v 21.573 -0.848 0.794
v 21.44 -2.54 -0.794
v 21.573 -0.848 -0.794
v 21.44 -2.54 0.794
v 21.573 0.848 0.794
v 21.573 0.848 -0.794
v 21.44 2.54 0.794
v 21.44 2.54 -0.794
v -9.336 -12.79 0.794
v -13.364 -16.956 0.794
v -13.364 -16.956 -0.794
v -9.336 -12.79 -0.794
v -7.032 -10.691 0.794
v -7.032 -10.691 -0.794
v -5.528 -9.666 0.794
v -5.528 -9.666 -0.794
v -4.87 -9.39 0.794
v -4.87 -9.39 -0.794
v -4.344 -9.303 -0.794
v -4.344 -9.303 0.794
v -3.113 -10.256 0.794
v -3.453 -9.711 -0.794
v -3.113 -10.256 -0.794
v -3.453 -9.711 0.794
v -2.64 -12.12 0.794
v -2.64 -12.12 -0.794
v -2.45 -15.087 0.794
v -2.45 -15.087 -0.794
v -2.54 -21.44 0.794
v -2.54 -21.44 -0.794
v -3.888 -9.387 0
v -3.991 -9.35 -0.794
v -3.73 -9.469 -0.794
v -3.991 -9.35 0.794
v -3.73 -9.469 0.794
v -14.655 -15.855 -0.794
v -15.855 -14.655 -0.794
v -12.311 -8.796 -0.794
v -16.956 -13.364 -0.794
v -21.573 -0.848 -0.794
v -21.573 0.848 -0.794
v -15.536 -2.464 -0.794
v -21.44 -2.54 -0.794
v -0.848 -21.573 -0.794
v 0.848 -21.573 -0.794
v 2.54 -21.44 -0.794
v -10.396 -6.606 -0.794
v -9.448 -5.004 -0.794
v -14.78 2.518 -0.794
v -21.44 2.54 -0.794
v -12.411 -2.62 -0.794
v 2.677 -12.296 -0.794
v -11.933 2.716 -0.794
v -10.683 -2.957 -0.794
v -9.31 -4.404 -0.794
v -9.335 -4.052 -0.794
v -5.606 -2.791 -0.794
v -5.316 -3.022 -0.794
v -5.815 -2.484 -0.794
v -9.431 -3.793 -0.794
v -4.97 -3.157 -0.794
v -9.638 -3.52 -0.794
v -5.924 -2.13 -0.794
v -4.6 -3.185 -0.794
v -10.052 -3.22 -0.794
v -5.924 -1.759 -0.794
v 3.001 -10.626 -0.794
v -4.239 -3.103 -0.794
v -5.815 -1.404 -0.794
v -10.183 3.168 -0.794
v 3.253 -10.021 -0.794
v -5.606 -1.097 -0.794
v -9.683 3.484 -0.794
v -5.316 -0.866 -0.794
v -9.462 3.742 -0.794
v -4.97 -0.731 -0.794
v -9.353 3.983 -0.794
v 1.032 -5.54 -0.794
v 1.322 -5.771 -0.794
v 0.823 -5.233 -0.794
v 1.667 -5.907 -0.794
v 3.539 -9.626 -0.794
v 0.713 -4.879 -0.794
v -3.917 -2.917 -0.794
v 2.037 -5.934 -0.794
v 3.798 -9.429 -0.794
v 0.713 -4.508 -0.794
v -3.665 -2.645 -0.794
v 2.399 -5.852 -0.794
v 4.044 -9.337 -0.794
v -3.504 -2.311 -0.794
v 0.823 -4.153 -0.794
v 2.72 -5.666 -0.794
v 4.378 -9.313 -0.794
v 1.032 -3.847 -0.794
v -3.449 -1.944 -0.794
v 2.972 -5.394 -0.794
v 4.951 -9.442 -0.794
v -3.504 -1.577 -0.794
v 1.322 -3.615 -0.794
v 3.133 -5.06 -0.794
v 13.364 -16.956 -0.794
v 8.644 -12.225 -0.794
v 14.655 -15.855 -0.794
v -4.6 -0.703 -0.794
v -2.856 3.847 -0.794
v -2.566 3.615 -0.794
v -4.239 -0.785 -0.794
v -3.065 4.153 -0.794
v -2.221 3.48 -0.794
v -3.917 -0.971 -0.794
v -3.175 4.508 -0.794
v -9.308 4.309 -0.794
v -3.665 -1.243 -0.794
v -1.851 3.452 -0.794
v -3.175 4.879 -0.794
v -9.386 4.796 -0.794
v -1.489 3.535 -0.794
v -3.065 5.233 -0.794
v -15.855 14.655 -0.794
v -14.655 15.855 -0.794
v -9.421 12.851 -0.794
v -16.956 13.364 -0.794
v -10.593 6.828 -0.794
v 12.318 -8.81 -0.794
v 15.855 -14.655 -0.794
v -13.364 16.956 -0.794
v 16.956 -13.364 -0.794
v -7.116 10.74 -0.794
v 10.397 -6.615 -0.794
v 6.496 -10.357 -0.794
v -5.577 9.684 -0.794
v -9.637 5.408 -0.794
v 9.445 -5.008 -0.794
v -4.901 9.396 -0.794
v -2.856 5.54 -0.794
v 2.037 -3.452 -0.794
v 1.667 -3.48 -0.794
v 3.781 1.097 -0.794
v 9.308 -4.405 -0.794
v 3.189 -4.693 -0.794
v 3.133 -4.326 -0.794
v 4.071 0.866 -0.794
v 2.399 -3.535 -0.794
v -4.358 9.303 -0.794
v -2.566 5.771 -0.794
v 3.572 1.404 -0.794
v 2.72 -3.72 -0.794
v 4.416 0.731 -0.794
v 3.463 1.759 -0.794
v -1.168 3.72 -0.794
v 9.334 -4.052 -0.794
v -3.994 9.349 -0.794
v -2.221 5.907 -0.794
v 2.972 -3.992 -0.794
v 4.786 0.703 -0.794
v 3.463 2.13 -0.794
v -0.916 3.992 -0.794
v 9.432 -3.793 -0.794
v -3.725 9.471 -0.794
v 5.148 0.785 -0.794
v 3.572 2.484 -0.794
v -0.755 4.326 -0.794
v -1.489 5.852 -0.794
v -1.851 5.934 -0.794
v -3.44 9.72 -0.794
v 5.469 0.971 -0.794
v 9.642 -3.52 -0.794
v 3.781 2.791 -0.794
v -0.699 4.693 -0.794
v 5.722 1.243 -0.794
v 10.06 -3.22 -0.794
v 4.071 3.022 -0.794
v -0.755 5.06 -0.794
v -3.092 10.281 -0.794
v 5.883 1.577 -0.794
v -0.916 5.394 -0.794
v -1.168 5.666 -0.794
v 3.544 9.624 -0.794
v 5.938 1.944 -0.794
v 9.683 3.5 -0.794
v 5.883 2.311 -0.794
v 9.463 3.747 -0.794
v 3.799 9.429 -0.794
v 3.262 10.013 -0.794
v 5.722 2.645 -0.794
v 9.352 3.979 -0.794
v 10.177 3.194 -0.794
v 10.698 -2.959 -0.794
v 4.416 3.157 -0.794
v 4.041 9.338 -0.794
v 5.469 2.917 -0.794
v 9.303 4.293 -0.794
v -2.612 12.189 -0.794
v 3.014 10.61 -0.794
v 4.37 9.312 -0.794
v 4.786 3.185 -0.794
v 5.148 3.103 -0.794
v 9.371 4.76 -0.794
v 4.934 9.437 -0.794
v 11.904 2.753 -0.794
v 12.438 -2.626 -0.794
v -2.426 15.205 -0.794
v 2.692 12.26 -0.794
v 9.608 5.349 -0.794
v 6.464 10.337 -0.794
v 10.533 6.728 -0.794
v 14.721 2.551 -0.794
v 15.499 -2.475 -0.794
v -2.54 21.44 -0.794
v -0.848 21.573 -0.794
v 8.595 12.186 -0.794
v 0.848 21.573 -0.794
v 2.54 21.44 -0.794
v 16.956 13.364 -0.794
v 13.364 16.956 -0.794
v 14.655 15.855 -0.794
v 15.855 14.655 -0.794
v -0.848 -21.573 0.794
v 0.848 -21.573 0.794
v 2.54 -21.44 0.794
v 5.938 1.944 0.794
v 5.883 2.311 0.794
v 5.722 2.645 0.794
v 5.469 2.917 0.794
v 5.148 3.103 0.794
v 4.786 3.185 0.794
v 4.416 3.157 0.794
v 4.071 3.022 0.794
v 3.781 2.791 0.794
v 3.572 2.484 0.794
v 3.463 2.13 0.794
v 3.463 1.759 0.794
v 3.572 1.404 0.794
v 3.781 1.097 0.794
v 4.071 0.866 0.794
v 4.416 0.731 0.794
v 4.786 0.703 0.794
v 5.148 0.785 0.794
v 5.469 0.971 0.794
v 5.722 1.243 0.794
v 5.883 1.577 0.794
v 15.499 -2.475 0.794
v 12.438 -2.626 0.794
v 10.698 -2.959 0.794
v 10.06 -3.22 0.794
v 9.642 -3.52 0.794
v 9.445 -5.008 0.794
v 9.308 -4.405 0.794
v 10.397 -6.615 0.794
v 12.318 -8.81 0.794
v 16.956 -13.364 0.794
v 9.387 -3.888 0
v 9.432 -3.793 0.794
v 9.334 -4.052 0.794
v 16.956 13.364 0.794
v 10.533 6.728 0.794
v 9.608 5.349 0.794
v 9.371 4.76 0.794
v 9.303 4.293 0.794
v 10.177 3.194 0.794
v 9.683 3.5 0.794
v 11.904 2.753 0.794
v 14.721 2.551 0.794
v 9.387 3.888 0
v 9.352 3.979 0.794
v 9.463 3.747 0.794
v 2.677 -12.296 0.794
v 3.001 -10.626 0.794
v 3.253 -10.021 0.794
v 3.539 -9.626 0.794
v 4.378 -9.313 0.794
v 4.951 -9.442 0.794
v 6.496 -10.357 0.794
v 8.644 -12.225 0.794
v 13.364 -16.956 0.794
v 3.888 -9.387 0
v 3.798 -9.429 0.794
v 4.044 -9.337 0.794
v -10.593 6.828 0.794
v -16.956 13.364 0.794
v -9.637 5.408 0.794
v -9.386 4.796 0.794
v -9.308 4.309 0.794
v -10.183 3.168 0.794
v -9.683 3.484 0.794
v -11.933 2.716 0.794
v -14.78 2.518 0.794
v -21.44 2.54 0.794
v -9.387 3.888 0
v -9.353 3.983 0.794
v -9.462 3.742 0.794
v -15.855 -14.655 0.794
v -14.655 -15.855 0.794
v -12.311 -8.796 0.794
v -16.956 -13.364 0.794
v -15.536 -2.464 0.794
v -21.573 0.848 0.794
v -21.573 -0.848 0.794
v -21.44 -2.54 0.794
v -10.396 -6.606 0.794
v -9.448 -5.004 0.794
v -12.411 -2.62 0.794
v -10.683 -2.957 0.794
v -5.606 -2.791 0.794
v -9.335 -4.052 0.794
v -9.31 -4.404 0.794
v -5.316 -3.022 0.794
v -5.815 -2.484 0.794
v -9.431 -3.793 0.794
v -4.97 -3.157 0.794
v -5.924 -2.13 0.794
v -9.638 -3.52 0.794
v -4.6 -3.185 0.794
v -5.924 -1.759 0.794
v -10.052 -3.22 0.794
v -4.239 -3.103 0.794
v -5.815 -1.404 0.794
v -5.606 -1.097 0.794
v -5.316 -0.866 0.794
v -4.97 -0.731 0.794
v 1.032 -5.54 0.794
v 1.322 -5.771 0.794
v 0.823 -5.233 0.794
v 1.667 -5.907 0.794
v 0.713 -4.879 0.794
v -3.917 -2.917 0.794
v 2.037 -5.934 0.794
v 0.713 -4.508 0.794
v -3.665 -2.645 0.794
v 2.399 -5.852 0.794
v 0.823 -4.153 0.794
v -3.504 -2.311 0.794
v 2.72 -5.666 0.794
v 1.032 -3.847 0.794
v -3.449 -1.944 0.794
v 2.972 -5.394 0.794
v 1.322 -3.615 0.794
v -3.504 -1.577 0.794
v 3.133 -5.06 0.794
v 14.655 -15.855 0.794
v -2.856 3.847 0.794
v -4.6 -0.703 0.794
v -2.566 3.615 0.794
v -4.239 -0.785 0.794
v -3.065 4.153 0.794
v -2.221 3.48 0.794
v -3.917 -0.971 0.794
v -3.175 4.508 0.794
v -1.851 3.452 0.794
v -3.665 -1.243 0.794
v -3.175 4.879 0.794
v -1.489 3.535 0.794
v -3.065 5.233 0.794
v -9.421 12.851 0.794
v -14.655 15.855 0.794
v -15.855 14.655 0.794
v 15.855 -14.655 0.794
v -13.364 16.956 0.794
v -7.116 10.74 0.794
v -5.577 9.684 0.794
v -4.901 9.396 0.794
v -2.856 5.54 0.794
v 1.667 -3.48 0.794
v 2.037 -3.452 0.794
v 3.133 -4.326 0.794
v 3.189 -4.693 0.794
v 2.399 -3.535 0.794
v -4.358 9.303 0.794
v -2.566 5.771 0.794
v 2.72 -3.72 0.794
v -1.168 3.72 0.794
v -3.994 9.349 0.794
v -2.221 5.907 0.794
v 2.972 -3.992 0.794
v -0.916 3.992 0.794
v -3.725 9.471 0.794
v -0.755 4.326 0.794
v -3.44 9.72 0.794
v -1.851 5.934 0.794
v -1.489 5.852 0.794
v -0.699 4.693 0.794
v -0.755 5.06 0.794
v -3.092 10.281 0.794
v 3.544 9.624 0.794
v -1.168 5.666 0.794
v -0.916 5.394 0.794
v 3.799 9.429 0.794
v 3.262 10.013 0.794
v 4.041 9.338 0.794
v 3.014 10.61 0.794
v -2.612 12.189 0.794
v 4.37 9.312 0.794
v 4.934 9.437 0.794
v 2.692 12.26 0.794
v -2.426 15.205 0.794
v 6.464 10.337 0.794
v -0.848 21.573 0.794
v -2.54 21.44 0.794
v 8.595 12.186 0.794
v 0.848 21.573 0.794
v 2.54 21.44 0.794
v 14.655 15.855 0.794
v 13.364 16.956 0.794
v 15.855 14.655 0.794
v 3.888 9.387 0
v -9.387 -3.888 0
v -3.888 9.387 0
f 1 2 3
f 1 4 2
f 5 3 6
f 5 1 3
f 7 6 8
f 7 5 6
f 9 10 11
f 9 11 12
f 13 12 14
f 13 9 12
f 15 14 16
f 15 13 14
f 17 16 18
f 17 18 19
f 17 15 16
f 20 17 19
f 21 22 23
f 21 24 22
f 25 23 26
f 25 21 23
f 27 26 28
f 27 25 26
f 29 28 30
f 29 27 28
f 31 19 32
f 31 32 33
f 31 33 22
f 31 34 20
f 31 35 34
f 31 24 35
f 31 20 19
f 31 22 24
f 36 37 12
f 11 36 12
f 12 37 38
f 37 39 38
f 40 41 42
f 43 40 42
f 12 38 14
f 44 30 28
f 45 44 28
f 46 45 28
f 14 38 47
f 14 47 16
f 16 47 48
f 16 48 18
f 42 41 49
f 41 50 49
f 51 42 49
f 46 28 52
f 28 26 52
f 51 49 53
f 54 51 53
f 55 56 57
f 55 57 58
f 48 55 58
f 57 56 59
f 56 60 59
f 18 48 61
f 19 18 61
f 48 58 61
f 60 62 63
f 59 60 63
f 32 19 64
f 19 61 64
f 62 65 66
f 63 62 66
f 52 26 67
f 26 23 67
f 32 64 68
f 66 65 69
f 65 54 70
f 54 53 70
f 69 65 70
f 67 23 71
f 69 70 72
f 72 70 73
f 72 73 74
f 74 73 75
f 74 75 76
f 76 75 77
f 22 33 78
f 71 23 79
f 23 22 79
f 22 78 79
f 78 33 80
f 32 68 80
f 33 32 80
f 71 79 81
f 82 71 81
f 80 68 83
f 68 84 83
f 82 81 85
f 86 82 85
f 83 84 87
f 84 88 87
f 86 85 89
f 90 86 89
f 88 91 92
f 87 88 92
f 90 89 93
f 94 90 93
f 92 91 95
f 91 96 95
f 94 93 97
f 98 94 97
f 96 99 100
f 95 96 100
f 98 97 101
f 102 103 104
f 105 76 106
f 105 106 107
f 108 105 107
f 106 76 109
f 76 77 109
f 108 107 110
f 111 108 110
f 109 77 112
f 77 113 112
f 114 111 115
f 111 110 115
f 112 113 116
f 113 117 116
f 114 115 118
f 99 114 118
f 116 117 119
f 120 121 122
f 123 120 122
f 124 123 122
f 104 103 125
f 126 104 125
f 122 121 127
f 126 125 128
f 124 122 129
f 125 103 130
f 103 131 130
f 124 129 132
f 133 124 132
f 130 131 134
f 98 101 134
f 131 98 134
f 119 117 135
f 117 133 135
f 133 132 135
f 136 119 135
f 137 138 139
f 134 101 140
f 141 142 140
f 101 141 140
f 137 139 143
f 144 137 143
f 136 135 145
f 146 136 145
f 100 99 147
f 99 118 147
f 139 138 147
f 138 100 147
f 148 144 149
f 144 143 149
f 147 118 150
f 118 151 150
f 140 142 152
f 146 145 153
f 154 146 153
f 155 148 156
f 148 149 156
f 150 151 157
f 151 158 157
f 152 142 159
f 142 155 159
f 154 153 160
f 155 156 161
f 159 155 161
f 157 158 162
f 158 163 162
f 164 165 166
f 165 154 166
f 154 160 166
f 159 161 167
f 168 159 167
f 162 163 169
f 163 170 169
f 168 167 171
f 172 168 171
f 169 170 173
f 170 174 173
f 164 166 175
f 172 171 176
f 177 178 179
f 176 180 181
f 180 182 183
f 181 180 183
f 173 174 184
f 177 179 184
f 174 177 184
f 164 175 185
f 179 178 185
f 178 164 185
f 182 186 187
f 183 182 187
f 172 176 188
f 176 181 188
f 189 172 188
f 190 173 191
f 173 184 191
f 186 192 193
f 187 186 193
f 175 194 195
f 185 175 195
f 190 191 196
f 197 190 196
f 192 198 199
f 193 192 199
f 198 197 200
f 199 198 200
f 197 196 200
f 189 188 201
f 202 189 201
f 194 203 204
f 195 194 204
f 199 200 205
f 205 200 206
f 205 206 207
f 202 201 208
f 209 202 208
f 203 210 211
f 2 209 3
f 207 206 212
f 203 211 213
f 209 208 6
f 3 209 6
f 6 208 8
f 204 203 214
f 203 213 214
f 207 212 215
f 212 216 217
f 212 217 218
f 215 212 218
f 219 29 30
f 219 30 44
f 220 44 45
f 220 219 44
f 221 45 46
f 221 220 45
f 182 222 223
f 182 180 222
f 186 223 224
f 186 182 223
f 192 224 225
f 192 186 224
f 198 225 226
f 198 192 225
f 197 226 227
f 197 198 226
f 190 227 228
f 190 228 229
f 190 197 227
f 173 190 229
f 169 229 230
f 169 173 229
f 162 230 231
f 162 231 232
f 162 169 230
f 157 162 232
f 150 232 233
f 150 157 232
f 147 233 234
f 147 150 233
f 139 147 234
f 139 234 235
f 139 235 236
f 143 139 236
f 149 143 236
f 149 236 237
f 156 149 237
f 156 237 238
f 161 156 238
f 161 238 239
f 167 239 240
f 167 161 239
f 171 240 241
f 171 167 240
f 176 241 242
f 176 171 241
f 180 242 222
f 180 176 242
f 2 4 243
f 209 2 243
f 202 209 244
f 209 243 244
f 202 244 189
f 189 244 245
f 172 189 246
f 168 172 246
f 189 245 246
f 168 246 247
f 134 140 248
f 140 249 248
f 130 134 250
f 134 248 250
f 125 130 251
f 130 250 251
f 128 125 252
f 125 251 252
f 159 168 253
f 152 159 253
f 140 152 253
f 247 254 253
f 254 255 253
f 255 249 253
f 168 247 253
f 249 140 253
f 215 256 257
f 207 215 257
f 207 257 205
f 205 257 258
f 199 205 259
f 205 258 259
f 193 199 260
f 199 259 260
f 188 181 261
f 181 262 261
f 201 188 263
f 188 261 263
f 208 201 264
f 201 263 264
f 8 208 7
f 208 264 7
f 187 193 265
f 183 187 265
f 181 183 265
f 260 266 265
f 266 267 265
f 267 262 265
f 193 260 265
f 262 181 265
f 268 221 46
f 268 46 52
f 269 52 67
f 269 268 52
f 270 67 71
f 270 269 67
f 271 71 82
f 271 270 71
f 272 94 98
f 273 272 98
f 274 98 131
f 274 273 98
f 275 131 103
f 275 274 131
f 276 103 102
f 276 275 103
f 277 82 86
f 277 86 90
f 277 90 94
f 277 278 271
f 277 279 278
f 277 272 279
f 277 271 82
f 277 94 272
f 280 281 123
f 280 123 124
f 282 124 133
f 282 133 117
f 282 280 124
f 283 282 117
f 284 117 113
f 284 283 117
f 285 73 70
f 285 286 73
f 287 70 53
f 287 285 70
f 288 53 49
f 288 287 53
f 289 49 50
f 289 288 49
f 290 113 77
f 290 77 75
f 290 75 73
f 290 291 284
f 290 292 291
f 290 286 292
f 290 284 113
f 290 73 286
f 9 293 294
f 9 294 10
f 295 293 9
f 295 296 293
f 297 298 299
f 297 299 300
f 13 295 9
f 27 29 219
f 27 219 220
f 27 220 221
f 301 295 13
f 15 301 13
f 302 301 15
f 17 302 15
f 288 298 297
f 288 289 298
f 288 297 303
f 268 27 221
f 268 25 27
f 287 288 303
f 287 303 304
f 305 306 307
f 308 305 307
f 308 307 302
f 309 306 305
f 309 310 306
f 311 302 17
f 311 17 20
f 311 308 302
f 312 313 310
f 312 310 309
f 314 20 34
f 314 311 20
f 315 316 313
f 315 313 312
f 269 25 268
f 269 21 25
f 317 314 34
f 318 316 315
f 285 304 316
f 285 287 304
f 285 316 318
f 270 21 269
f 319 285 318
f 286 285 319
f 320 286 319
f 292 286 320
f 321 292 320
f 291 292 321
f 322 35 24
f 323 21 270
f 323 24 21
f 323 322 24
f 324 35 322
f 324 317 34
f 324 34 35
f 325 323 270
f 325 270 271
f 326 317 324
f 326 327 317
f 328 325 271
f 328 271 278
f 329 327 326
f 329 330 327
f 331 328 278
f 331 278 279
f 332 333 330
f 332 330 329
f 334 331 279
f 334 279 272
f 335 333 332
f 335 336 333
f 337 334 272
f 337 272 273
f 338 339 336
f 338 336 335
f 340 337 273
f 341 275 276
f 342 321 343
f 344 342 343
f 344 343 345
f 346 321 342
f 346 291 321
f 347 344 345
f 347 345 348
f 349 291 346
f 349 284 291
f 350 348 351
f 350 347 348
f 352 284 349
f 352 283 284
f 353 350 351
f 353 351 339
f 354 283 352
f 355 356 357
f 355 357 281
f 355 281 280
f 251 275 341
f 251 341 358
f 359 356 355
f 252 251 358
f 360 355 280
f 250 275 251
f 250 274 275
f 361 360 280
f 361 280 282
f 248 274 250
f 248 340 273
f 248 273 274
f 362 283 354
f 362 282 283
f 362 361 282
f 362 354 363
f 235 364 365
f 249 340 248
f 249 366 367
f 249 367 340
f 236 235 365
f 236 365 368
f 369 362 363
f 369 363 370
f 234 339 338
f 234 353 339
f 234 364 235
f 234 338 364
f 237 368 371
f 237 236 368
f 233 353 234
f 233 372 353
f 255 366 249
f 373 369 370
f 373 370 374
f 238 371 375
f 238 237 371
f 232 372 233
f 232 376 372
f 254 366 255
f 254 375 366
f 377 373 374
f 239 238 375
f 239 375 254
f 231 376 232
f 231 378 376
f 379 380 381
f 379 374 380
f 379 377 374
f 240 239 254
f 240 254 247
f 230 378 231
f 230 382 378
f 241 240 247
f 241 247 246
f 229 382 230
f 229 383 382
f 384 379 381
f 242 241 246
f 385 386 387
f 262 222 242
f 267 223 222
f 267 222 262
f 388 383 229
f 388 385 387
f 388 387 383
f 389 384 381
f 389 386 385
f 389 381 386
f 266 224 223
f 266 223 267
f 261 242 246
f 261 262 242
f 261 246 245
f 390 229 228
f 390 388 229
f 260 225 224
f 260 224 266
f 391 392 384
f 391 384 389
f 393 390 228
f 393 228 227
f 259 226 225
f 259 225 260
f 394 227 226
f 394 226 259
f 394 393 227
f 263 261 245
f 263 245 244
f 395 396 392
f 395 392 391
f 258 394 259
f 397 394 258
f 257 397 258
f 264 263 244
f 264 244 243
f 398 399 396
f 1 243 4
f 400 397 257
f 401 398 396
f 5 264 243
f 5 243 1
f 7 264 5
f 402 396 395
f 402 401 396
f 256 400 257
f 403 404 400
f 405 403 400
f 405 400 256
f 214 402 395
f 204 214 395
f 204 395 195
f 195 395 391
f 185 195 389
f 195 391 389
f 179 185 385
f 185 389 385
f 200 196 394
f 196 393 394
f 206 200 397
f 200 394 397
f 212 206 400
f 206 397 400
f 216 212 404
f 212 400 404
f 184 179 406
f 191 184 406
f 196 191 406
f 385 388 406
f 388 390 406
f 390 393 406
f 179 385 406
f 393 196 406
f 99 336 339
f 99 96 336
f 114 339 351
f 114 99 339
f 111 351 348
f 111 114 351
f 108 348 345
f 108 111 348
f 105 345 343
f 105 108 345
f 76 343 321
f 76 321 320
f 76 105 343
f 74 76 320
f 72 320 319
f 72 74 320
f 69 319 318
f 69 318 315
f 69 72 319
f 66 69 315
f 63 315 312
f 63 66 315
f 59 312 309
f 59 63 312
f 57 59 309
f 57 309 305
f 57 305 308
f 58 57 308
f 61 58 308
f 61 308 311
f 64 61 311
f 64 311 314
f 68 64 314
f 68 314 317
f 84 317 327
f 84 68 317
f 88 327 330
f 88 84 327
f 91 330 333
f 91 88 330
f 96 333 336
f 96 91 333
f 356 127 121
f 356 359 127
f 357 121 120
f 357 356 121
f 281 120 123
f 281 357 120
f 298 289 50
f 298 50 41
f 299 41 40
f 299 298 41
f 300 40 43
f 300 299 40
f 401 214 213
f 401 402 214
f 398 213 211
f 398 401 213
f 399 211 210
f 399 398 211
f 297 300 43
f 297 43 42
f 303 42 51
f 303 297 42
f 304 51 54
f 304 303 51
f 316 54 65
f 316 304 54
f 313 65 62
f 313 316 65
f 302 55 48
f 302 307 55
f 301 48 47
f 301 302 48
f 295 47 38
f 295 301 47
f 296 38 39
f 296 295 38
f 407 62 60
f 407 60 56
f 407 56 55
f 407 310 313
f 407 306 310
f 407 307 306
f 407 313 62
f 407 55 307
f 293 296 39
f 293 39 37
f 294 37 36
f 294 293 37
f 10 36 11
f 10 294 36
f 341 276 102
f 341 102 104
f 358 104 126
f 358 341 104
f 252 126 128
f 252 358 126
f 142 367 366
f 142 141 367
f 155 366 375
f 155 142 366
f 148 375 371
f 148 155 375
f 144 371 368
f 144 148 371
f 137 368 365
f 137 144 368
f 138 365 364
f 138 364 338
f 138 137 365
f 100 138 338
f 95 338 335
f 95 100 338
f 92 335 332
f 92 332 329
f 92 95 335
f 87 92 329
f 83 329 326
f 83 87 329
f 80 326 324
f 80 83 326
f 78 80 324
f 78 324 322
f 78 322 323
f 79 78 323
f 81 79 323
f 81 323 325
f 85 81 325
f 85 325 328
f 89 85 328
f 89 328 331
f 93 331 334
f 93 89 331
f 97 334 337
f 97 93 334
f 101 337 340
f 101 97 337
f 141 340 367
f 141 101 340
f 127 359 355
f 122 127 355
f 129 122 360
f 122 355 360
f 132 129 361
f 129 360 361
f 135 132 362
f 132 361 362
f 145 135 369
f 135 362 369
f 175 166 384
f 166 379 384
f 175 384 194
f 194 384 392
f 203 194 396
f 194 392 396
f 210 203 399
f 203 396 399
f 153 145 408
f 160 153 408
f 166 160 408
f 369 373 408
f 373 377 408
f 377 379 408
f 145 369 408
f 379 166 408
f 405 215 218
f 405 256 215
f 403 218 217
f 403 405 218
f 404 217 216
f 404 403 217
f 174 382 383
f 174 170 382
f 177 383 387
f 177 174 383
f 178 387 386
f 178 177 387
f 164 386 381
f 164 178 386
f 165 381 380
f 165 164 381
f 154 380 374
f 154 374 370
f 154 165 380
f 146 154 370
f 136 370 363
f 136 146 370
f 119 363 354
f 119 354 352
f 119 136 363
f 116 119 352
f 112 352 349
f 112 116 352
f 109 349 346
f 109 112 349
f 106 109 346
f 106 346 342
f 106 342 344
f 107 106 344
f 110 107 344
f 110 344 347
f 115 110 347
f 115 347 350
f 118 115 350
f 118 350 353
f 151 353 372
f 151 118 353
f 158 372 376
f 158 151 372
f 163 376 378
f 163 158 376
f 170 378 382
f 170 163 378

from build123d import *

# Parameters (mm, degrees)
F0_R     = 1.2446
F1_DEPTH = 0.79375
F6_DEPTH = 1.5875


with BuildPart() as f1:
    # F0 (on Top) → F1 (new body, symmetric)
    with BuildSketch(Plane.XY):
        with BuildLine():
            ThreePointArc((-13.3643659864, 16.9564684348), (-15.2664354058, 15.2664354058), (-16.9564684348, 13.3643659864))
            ThreePointArc((-16.9564684348, 13.3643659864), (-16.6604544533, 6.9009861898), (-21.4400676305, 2.54))
            ThreePointArc((-21.4400676305, 2.54), (-21.59, 0), (-21.4400676305, -2.54))
            ThreePointArc((-21.4400676305, -2.54), (-16.6604544533, -6.9009861898), (-16.9564684348, -13.3643659864))
            ThreePointArc((-16.9564684348, -13.3643659864), (-15.2664354058, -15.2664354058), (-13.3643659864, -16.9564684348))
            ThreePointArc((-13.3643659864, -16.9564684348), (-6.9009861898, -16.6604544533), (-2.54, -21.4400676305))
            ThreePointArc((-2.54, -21.4400676305), (0, -21.59), (2.54, -21.4400676305))
            ThreePointArc((2.54, -21.4400676305), (6.9009861898, -16.6604544533), (13.3643659864, -16.9564684348))
            ThreePointArc((13.3643659864, -16.9564684348), (15.2664354058, -15.2664354058), (16.9564684348, -13.3643659864))
            ThreePointArc((16.9564684348, -13.3643659864), (16.6604544533, -6.9009861898), (21.4400676305, -2.54))
            ThreePointArc((21.4400676305, -2.54), (21.59, 0), (21.4400676305, 2.54))
            ThreePointArc((21.4400676305, 2.54), (16.6604544533, 6.9009861898), (16.9564684348, 13.3643659864))
            ThreePointArc((16.9564684348, 13.3643659864), (15.2664354058, 15.2664354058), (13.3643659864, 16.9564684348))
            ThreePointArc((13.3643659864, 16.9564684348), (6.9009861898, 16.6604544533), (2.54, 21.4400676305))
            ThreePointArc((2.54, 21.4400676305), (0, 21.59), (-2.54, 21.4400676305))
            ThreePointArc((-2.54, 21.4400676305), (-6.9009861898, 16.6604544533), (-13.3643659864, 16.9564684348))
        make_face()
        with Locations((-4.6933080252, -1.9440318364)):
            Circle(F0_R, mode=Mode.SUBTRACT)
        with Locations((1.9440318364, -4.6933080252)):
            Circle(F0_R, mode=Mode.SUBTRACT)
        with Locations((-1.9440318364, 4.6933080252)):
            Circle(F0_R, mode=Mode.SUBTRACT)
        with Locations((4.6933080252, 1.9440318364)):
            Circle(F0_R, mode=Mode.SUBTRACT)
    extrude(amount=F1_DEPTH, both=True)

    # F5 (on face) → F6 (cut, through all)
    with BuildSketch(Plane.XY.offset(0.79375)):
        with BuildLine():
            ThreePointArc((21.4400676305, 2.54), (16.6604544533, 6.9009861898), (16.9564684348, 13.3643659864))
            add(Edge.make_bspline(
                [(16.9564684348, 13.3643659864), (12.7702234313, 9.1661904007), (4.5537464117, 1.9143787537), (15.6687479466, 2.5573067833), (21.4400676305, 2.54)],
                knots=[0, 0, 0, 0, 0.5, 1, 1, 1, 1], degree=3))
        make_face()
        with BuildLine():
            ThreePointArc((2.54, -21.4400676305), (6.9009861898, -16.6604544533), (13.3643659864, -16.9564684348))
            add(Edge.make_bspline(
                [(2.54, -21.4400676305), (2.5372293312, -15.7558191568), (1.8345788445, -4.4215889444), (9.3458676711, -12.9474671558), (13.3643659864, -16.9564684348)],
                knots=[0, 0, 0, 0, 0.5, 1, 1, 1, 1], degree=3))
        make_face()
        with BuildLine():
            ThreePointArc((16.9564684348, -13.3643659864), (16.6604544533, -6.9009861898), (21.4400676305, -2.54))
            add(Edge.make_bspline(
                [(21.4400676305, -2.54), (16.1842592061, -2.4963843171), (4.082315581, -1.6922755491), (13.1975738332, -9.6713192761), (16.9564684348, -13.3643659864)],
                knots=[0, 0, 0, 0, 0.5, 1, 1, 1, 1], degree=3))
        make_face()
        with BuildLine():
            ThreePointArc((-13.3643659864, -16.9564684348), (-6.9009861898, -16.6604544533), (-2.54, -21.4400676305))
            add(Edge.make_bspline(
                [(-13.3643659864, -16.9564684348), (-9.9083529785, -13.3942691609), (-1.5885540375, -3.8302056287), (-2.4667936377, -16.4917837828), (-2.54, -21.4400676305)],
                knots=[0, 0, 0, 0, 0.5, 1, 1, 1, 1], degree=3))
        make_face()
        with BuildLine():
            add(Edge.make_bspline(
                [(2.54, 21.4400676305), (2.5480384938, 15.6409479678), (1.8768956976, 4.5266398025), (9.2504248023, 12.8522366285), (13.3643659864, 16.9564684348)],
                knots=[0, 0, 0, 0, 0.5, 1, 1, 1, 1], degree=3))
            ThreePointArc((13.3643659864, 16.9564684348), (6.9009861898, 16.6604544533), (2.54, 21.4400676305))
        make_face()
        with BuildLine():
            add(Edge.make_bspline(
                [(-13.3643659864, 16.9564684348), (-10.1164951921, 13.5911004618), (-1.4928890483, 3.6003961955), (-2.4499814026, 16.7545713484), (-2.54, 21.4400676305)],
                knots=[0, 0, 0, 0, 0.5, 1, 1, 1, 1], degree=3))
            ThreePointArc((-2.54, 21.4400676305), (-6.9009861898, 16.6604544533), (-13.3643659864, 16.9564684348))
        make_face()
        with BuildLine():
            add(Edge.make_bspline(
                [(-16.9564684348, 13.3643659864), (-12.9633266479, 9.4111068174), (-4.3837218341, 1.8060450999), (-15.8156938851, 2.5290576741), (-21.4400676305, 2.54)],
                knots=[0, 0, 0, 0, 0.5, 1, 1, 1, 1], degree=3))
            ThreePointArc((-16.9564684348, 13.3643659864), (-16.6604544533, 6.9009861898), (-21.4400676305, 2.54))
        make_face()
        with BuildLine():
            add(Edge.make_bspline(
                [(-21.4400676305, -2.54), (-16.1078236997, -2.4722644594), (-4.1337008384, -1.7207956731), (-13.1712388247, -9.6383988857), (-16.9564684348, -13.3643659864)],
                knots=[0, 0, 0, 0, 0.5, 1, 1, 1, 1], degree=3))
            ThreePointArc((-21.4400676305, -2.54), (-16.6604544533, -6.9009861898), (-16.9564684348, -13.3643659864))
        make_face()
    extrude(amount=-F6_DEPTH, mode=Mode.SUBTRACT)


solid = f1.part
